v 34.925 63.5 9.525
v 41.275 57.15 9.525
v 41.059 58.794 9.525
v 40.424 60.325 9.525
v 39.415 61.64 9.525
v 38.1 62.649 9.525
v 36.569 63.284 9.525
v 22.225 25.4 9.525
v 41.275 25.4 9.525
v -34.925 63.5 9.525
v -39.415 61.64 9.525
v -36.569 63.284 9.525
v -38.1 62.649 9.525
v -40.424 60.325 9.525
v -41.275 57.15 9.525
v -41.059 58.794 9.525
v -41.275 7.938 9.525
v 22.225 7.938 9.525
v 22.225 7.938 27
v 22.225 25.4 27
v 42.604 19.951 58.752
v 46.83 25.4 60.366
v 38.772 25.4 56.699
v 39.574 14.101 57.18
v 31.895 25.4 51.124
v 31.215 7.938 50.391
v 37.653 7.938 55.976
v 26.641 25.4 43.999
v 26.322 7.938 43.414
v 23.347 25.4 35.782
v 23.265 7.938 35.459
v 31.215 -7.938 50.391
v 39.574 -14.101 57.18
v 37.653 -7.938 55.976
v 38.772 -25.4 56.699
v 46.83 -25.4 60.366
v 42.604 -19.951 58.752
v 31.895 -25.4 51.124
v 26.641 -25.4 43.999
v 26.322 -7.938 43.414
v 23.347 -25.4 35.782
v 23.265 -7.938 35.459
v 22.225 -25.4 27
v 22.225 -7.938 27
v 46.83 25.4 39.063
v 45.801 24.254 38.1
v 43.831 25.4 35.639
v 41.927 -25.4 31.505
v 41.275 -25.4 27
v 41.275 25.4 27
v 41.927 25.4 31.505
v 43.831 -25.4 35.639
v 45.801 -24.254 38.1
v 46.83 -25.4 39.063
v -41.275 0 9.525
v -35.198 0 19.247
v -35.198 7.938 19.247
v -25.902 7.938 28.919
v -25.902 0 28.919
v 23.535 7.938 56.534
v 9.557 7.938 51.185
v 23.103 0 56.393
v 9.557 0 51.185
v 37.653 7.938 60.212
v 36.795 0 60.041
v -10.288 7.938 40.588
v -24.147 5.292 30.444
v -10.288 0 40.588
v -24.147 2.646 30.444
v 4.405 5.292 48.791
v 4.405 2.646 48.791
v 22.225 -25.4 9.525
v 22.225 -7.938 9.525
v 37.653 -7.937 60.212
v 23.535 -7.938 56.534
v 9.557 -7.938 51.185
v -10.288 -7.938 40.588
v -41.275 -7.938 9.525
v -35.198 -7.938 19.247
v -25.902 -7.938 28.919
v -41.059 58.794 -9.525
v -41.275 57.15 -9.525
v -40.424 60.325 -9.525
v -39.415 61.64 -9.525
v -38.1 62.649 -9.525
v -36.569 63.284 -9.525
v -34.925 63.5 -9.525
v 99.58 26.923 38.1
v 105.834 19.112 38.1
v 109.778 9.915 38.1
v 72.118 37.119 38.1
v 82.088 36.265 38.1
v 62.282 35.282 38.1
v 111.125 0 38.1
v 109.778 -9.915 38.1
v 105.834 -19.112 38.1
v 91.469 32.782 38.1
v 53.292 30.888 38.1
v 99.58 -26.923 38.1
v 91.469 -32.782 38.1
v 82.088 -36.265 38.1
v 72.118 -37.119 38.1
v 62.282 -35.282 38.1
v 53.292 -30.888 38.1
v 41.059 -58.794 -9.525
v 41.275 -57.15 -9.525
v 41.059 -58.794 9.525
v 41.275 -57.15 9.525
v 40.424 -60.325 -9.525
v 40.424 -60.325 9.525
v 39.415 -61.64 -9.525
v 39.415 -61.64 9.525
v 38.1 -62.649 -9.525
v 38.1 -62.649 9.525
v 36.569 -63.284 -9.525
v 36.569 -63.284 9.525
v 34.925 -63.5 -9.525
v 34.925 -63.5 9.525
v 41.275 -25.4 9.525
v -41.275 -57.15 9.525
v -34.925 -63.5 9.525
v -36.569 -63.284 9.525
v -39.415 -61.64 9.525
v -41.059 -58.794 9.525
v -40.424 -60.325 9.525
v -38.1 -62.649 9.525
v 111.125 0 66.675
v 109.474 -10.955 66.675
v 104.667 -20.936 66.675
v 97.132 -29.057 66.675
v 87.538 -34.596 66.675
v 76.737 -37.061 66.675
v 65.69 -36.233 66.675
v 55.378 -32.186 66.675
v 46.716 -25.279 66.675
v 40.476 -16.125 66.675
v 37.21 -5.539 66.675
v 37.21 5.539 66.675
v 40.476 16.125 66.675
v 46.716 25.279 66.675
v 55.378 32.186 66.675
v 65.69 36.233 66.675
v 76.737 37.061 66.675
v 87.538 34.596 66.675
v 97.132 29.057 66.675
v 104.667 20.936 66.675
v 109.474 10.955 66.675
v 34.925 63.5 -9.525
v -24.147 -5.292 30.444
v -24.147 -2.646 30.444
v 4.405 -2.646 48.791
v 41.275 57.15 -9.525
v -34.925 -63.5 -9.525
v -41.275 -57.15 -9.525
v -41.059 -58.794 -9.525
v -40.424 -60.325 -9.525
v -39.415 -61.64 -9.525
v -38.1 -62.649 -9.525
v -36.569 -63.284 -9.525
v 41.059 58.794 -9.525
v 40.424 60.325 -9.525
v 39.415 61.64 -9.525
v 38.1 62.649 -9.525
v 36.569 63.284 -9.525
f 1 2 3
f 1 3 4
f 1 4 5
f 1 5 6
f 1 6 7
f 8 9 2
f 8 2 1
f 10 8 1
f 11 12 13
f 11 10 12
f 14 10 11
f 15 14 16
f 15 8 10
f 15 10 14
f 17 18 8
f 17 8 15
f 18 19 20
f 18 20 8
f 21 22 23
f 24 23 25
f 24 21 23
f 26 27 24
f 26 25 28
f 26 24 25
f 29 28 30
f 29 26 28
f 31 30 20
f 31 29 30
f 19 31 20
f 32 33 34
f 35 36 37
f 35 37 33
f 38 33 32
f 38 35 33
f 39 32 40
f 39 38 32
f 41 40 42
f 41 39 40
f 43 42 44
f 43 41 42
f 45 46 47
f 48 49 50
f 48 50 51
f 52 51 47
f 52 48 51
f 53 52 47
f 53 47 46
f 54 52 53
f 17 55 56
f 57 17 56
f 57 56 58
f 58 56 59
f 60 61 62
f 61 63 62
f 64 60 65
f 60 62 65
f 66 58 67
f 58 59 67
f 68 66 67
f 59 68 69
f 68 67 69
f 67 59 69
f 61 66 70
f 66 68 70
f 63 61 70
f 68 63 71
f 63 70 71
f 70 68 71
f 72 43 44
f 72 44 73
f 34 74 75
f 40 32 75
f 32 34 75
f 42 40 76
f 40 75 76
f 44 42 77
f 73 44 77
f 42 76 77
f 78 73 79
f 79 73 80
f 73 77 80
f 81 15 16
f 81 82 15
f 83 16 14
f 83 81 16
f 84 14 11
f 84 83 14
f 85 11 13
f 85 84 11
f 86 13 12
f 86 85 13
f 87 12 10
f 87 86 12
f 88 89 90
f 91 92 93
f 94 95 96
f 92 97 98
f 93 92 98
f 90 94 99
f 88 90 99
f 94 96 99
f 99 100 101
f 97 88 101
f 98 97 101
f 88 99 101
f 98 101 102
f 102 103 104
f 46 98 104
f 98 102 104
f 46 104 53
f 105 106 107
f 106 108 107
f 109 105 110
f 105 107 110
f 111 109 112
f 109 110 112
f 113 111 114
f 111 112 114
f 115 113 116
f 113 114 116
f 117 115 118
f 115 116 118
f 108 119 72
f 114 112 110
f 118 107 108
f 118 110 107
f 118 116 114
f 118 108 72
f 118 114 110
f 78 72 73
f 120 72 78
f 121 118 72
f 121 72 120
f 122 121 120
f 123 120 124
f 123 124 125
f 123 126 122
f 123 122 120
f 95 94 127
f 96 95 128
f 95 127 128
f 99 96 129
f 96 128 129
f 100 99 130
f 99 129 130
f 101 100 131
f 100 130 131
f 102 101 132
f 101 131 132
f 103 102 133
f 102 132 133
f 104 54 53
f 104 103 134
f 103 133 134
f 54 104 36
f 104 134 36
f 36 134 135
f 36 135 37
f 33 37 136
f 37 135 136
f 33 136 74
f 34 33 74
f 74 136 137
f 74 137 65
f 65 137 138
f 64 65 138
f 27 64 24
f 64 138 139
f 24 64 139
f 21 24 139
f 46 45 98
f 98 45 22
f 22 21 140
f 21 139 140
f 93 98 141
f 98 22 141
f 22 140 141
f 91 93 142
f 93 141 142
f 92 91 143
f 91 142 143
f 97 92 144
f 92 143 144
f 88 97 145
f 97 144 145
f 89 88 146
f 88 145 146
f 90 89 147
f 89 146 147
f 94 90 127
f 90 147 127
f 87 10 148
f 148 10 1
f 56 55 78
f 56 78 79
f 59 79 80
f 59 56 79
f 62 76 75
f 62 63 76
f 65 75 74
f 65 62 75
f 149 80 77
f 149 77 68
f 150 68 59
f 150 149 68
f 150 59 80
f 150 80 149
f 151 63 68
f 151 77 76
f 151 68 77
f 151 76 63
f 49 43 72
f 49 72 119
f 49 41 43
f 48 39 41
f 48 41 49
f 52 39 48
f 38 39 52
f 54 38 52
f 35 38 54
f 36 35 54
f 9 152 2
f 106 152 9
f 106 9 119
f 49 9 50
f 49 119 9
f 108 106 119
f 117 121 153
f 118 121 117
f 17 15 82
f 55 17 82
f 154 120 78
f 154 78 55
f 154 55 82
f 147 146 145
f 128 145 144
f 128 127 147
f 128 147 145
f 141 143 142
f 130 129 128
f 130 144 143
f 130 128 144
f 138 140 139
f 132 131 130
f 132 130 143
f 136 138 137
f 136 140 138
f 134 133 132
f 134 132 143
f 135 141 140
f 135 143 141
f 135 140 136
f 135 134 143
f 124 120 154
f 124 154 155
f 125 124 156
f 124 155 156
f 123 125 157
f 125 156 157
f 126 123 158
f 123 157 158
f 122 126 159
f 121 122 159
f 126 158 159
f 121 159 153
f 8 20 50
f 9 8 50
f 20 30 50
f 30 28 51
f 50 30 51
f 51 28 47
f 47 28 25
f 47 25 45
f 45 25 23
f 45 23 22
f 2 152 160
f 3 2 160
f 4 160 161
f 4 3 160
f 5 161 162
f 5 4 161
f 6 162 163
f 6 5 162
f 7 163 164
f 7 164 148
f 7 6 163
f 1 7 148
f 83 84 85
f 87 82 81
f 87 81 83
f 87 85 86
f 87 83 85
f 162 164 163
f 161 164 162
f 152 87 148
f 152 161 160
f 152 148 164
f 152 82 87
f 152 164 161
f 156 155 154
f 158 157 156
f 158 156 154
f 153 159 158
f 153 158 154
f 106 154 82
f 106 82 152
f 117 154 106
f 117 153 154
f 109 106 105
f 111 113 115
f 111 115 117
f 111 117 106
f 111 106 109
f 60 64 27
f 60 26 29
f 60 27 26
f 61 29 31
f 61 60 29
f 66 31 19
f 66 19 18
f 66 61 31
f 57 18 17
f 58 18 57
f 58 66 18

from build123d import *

# Parameters (mm, degrees)
F1_DEPTH = 63.5
F2_DEPTH = 25.4
F3_DEPTH = 7.9375
F0_W     = 37.164882
F0_H     = 28.575
F5_R     = 6.35


with BuildPart() as f1:
    # F0 (on Front) → F1 (new body, symmetric)
    with BuildSketch(Plane.XZ):
        Polygon((-41.275, 9.525), (-41.275, -9.525), (41.275, -9.525), (41.275, 9.525), (22.225, 9.525), align=None)
    extrude(amount=F1_DEPTH, both=True)

    # F0 (on Front) → F2 (join, symmetric)
    with BuildSketch(Plane.XZ):
        with BuildLine():
            Line((22.225, 9.525), (41.275, 9.525))
            Line((41.275, 9.525), (41.275, 27.0002))
            ThreePointArc((41.275, 27.0002), (45.92468, 38.22552), (57.15, 42.8752))
            Line((57.15, 42.8752), (60.325, 42.8752))
            Line((60.325, 42.8752), (60.325, 61.9252))
            Line((60.325, 61.9252), (57.15, 61.9252))
            ThreePointArc((57.15, 61.9252), (32.454296, 51.695904), (22.225, 27.0002))
            Line((22.225, 27.0002), (22.225, 9.525))
        make_face()
        Polygon((60.325, 66.675), (60.325, 61.9252), (60.325, 42.8752), (60.325, 38.1), (73.960118, 38.1), (73.960118, 66.675), align=None)
    extrude(amount=F2_DEPTH, both=True)

    # F0 (on Front) → F3 (join, symmetric)
    with BuildSketch(Plane.XZ):
        with BuildLine():
            add(Edge.make_bspline(
                [(-41.275, 9.525), (-30.2571, 34.45055), (20.033766, 63.231468), (57.15, 61.9252)],
                knots=[0, 0, 0, 0, 111.504536, 111.504536, 111.504536, 111.504536], degree=3))
            Line((-41.275, 9.525), (22.225, 9.525))
            Line((22.225, 9.525), (22.225, 27.0002))
            ThreePointArc((22.225, 27.0002), (32.454296, 51.695904), (57.15, 61.9252))
        make_face()
    extrude(amount=F3_DEPTH, both=True)

    # F0 (on Front) → F4 (revolve)
    with BuildSketch(Plane.XZ):
        with Locations((92.542559, 52.3875)):
            Rectangle(F0_W, F0_H)
    revolve(axis=Axis((73.960118, 0, 52.3875), (0, 0, -1)))

    # F5
    f5_edges = [f1.edges().sort_by_distance(p)[0] for p in [
        (-41.275, -63.5, 0),
        (41.275, -63.5, 0),
        (-41.275, 63.5, 0),
        (41.275, 63.5, 0),
    ]]
    fillet(f5_edges, radius=F5_R)


solid = f1.part
